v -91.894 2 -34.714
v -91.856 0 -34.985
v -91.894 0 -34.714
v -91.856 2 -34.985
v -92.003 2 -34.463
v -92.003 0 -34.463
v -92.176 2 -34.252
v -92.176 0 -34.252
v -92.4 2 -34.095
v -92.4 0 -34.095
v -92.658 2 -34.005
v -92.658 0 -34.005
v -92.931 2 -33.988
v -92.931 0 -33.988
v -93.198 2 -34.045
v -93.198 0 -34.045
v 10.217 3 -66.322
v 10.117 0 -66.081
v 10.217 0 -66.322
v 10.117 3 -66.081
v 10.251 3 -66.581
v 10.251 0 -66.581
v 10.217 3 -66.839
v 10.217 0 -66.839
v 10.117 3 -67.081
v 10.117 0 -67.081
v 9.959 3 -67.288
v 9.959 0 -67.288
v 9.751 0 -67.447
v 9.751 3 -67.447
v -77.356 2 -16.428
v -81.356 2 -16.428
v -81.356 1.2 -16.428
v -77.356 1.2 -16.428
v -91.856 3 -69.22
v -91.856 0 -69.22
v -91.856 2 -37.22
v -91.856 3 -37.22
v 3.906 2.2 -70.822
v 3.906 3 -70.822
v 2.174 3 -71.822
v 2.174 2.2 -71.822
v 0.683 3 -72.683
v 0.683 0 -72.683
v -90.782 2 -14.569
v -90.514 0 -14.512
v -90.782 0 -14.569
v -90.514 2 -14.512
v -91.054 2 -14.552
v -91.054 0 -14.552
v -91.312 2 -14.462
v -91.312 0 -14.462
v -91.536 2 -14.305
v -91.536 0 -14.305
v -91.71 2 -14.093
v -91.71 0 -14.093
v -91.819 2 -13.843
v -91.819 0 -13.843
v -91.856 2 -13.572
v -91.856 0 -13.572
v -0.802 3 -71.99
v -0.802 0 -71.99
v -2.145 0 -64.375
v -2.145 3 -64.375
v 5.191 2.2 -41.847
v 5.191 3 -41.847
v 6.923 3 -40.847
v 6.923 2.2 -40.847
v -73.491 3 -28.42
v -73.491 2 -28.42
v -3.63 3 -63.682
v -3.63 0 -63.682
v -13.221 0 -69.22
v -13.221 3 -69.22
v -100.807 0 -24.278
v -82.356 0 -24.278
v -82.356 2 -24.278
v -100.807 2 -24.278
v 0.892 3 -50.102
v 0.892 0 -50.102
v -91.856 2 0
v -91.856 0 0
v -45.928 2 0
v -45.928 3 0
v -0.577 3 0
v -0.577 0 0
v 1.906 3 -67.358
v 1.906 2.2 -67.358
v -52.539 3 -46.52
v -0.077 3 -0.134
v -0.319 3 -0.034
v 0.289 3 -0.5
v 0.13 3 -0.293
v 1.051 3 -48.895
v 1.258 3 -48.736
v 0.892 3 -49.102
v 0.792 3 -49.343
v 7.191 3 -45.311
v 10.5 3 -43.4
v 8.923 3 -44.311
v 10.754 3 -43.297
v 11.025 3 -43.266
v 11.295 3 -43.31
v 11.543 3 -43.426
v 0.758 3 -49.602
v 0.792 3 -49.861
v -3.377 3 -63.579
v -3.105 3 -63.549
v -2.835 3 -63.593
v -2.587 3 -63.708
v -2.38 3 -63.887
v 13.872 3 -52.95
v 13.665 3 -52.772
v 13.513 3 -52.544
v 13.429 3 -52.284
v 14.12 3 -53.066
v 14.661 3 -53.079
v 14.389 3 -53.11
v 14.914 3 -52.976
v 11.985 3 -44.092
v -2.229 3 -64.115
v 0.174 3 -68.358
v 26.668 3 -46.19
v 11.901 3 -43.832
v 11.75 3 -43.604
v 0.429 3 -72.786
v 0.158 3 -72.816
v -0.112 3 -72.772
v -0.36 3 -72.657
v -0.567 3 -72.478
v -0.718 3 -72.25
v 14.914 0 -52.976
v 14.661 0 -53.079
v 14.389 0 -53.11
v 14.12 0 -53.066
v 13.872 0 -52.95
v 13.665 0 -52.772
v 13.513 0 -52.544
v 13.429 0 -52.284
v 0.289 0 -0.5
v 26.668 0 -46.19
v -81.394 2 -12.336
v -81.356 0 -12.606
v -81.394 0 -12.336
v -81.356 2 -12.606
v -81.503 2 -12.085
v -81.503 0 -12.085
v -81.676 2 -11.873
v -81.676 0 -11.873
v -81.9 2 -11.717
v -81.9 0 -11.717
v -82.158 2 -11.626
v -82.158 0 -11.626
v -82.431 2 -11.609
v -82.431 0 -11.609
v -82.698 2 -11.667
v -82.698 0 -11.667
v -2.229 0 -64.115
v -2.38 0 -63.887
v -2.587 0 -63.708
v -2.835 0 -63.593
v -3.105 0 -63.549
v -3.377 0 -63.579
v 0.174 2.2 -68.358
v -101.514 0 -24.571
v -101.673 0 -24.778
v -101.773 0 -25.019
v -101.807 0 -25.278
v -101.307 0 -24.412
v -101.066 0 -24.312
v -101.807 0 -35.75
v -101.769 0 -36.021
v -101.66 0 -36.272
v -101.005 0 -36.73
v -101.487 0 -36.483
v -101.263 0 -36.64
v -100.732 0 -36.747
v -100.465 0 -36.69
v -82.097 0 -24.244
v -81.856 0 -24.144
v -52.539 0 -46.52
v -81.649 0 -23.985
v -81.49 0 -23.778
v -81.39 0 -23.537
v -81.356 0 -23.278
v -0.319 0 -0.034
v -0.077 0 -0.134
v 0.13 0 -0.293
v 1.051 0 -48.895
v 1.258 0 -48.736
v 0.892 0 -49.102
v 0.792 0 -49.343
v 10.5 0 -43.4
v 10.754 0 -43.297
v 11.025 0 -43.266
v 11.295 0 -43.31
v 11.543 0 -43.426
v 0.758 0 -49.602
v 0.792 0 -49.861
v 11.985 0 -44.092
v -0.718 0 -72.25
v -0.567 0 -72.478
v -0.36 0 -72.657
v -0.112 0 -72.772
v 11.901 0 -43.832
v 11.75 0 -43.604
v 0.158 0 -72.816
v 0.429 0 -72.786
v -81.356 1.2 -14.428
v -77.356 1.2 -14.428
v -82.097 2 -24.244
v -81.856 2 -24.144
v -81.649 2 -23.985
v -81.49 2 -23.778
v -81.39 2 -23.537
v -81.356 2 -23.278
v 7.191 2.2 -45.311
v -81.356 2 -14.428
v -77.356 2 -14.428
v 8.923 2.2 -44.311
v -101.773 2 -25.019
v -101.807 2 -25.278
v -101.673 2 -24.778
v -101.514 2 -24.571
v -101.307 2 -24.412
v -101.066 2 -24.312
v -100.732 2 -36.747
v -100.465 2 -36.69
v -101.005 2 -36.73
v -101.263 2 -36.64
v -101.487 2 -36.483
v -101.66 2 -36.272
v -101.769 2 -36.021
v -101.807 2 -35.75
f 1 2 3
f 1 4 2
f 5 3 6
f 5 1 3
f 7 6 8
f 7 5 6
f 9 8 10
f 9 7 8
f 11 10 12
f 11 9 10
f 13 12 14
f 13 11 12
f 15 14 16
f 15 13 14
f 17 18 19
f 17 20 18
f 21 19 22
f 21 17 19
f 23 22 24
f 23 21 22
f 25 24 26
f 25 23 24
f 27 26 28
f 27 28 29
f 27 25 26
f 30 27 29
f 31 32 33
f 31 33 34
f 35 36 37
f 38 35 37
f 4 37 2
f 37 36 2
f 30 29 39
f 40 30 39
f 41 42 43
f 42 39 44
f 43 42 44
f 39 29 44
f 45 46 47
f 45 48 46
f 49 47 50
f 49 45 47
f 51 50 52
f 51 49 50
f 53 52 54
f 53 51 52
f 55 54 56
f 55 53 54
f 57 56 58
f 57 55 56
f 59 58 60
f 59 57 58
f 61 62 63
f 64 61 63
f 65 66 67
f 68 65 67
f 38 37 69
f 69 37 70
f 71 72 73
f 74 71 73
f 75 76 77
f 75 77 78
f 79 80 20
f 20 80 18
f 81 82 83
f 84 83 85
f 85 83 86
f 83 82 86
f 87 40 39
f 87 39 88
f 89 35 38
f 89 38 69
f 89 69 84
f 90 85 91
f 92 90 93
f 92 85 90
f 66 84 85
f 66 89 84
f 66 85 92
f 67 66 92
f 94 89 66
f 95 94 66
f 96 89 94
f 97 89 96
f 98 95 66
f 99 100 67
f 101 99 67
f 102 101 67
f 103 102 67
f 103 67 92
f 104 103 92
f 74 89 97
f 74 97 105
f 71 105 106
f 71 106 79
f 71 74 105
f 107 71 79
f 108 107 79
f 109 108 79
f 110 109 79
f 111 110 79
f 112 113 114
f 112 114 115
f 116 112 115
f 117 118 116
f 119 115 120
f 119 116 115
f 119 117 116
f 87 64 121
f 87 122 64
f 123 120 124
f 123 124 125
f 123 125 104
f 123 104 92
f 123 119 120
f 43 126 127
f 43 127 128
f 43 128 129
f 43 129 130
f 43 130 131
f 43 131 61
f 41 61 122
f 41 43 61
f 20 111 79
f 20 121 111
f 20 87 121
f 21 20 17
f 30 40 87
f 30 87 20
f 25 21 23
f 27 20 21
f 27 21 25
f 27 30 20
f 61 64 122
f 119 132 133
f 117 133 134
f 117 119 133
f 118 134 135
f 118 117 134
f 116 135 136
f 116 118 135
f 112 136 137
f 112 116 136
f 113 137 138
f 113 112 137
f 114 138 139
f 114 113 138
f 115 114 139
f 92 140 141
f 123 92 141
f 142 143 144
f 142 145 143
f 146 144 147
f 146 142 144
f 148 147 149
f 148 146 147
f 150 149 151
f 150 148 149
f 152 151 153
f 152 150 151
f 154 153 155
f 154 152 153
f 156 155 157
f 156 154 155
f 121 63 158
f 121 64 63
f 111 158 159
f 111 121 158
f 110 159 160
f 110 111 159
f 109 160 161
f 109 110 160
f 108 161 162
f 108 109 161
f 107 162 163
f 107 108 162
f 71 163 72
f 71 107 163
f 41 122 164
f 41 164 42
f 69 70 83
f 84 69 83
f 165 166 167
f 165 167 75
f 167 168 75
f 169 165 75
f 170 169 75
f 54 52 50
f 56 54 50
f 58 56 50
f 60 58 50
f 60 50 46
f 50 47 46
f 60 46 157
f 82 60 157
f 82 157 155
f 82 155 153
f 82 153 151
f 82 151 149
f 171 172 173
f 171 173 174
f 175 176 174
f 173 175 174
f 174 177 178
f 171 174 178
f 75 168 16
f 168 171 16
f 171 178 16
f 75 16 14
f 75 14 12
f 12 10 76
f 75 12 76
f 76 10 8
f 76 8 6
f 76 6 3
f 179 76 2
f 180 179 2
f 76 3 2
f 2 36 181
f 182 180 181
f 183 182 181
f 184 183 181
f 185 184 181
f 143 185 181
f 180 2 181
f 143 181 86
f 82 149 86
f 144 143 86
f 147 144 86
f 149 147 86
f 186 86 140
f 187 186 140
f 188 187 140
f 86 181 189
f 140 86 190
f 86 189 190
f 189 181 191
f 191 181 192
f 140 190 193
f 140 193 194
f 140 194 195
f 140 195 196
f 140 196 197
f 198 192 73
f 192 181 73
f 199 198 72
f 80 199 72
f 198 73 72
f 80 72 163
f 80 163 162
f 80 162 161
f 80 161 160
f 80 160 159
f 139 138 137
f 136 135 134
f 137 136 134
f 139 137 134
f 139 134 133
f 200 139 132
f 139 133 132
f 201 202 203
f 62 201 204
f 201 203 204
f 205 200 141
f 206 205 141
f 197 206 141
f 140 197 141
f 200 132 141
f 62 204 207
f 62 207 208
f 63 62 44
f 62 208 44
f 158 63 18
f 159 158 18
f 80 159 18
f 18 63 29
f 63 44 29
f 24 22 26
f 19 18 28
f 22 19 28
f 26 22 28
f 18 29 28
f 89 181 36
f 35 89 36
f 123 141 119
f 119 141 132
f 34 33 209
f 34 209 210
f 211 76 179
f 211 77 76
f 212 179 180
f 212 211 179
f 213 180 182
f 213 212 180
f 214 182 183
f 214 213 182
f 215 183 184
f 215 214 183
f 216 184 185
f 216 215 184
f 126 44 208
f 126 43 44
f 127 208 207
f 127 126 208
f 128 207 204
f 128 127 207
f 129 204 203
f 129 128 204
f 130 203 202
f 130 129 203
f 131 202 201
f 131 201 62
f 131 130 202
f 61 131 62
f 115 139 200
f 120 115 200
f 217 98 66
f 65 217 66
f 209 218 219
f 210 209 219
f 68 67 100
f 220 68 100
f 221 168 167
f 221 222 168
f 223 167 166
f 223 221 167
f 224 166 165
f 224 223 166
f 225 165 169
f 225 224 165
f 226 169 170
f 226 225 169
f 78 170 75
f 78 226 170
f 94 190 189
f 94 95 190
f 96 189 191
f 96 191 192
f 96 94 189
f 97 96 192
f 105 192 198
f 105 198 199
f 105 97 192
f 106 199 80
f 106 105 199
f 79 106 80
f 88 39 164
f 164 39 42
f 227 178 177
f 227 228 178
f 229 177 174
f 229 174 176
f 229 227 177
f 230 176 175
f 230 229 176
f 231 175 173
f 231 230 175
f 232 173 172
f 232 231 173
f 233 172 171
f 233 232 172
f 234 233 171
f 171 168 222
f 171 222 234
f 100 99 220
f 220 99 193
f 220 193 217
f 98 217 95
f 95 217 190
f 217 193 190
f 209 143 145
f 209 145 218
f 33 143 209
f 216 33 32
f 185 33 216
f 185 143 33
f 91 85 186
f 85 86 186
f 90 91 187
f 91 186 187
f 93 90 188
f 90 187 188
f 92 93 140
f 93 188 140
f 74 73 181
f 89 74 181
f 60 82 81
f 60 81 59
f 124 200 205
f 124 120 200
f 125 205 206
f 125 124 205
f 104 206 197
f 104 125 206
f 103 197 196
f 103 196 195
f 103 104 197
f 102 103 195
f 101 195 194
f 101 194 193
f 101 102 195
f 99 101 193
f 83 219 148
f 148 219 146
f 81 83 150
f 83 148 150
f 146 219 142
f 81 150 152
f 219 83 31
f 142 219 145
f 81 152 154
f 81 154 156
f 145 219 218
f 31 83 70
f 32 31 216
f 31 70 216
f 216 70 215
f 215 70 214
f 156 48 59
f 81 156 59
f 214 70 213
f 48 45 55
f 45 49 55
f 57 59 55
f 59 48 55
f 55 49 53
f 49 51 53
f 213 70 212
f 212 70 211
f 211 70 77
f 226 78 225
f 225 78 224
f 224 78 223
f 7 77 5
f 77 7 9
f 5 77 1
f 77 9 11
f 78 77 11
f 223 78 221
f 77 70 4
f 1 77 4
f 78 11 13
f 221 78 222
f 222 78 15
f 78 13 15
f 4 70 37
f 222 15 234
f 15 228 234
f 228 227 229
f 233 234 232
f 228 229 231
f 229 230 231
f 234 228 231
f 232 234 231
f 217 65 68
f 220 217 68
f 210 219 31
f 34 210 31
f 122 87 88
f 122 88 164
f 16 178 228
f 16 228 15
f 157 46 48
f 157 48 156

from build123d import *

# Parameters (mm, degrees)
P_IDAT_VYSUNUT_M1_DEPTH  = 3
P_IDAT_VYSUNUT_M2_DEPTH  = 2
ZAOBLIT1_R               = 1
SKICA3_W                 = 4
SKICA3_H                 = 2
ODEBRAT_VYSUNUT_M1_DEPTH = 0.8
ODEBRAT_VYSUNUT_M2_DEPTH = 0.8


with BuildPart() as part:
    # Skica1 → P_idat vysunut_m1 (new body)
    with BuildSketch(Plane(origin=(0, 0, 0), x_dir=(1, 0, 0), z_dir=(0, 1, 0))):
        Polygon((26.667853432, 46.190077074), (13.677472376, 53.690077074), (11.737150801, 42.685966604), (0.392218012, 49.235966604), (10.61747027, 66.946623035), (-0.554257439, 73.396623035), (-2.393036353, 62.968389614), (-13.22114317, 69.22), (-52.538696502, 46.52), (-91.856249834, 69.22), (-91.856249834, 37.22), (-73.49138407, 28.419769911), (-45.928124917, 0), (0, 0), align=None)
    extrude(amount=P_IDAT_VYSUNUT_M1_DEPTH)

    # Skica1_15 → P_idat vysunut_m2 (add)
    with BuildSketch(Plane(origin=(0, 0, 0), x_dir=(1, 0, 0), z_dir=(0, 1, 0))):
        Polygon((-91.856249834, 0), (-45.928124917, 0), (-73.49138407, 28.419769911), (-91.856249834, 37.22), (-91.856249834, 33.55662508), (-101.80675435, 37.17831254), (-101.80675435, 24.27831254), (-81.356249834, 24.27831254), (-81.356249834, 11.17831254), (-91.856249834, 15), align=None)
    extrude(amount=P_IDAT_VYSUNUT_M2_DEPTH)

    # Zaoblit1
    zaoblit1_edges = [part.edges().sort_by_distance(p)[0] for p in [
        (-81.356249834, 1, -11.17831254),
        (-91.856249834, 1, -15),
        (-81.356249834, 1, -24.27831254),
        (-101.80675435, 1, -24.27831254),
        (-101.80675435, 1, -37.17831254),
        (-91.856249834, 1, -33.55662508),
        (0, 1.5, 0),
        (13.677472376, 1.5, -53.690077074),
        (11.737150801, 1.5, -42.685966604),
        (0.392218012, 1.5, -49.235966604),
        (-2.393036353, 1.5, -62.968389614),
        (-0.554257439, 1.5, -73.396623035),
        (10.61747027, 1.5, -66.946623035),
    ]]
    fillet(zaoblit1_edges, radius=ZAOBLIT1_R)

    # Skica3 → Odebrat vysunut_m1 (cut)
    with BuildSketch(Plane(origin=(0, 2, 0), x_dir=(1, 0, 0), z_dir=(0, 1, 0))):
        with Locations((-79.356249834, 15.42831254)):
            Rectangle(SKICA3_W, SKICA3_H)
    extrude(amount=-ODEBRAT_VYSUNUT_M1_DEPTH, mode=Mode.SUBTRACT)

    # Skica4 → Odebrat vysunut_m2 (cut)
    with BuildSketch(Plane(origin=(0, 3, 0), x_dir=(1, 0, 0), z_dir=(0, 1, 0))):
        Polygon((7.190517431, 45.310966604), (5.190517431, 41.846864989), (6.922568239, 40.846864989), (8.922568239, 44.310966604), align=None)
        Polygon((0.173722583, 68.35752142), (2.173722583, 71.821623035), (3.90577339, 70.821623035), (1.90577339, 67.35752142), align=None)
    extrude(amount=-ODEBRAT_VYSUNUT_M2_DEPTH, mode=Mode.SUBTRACT)


solid = part.part
